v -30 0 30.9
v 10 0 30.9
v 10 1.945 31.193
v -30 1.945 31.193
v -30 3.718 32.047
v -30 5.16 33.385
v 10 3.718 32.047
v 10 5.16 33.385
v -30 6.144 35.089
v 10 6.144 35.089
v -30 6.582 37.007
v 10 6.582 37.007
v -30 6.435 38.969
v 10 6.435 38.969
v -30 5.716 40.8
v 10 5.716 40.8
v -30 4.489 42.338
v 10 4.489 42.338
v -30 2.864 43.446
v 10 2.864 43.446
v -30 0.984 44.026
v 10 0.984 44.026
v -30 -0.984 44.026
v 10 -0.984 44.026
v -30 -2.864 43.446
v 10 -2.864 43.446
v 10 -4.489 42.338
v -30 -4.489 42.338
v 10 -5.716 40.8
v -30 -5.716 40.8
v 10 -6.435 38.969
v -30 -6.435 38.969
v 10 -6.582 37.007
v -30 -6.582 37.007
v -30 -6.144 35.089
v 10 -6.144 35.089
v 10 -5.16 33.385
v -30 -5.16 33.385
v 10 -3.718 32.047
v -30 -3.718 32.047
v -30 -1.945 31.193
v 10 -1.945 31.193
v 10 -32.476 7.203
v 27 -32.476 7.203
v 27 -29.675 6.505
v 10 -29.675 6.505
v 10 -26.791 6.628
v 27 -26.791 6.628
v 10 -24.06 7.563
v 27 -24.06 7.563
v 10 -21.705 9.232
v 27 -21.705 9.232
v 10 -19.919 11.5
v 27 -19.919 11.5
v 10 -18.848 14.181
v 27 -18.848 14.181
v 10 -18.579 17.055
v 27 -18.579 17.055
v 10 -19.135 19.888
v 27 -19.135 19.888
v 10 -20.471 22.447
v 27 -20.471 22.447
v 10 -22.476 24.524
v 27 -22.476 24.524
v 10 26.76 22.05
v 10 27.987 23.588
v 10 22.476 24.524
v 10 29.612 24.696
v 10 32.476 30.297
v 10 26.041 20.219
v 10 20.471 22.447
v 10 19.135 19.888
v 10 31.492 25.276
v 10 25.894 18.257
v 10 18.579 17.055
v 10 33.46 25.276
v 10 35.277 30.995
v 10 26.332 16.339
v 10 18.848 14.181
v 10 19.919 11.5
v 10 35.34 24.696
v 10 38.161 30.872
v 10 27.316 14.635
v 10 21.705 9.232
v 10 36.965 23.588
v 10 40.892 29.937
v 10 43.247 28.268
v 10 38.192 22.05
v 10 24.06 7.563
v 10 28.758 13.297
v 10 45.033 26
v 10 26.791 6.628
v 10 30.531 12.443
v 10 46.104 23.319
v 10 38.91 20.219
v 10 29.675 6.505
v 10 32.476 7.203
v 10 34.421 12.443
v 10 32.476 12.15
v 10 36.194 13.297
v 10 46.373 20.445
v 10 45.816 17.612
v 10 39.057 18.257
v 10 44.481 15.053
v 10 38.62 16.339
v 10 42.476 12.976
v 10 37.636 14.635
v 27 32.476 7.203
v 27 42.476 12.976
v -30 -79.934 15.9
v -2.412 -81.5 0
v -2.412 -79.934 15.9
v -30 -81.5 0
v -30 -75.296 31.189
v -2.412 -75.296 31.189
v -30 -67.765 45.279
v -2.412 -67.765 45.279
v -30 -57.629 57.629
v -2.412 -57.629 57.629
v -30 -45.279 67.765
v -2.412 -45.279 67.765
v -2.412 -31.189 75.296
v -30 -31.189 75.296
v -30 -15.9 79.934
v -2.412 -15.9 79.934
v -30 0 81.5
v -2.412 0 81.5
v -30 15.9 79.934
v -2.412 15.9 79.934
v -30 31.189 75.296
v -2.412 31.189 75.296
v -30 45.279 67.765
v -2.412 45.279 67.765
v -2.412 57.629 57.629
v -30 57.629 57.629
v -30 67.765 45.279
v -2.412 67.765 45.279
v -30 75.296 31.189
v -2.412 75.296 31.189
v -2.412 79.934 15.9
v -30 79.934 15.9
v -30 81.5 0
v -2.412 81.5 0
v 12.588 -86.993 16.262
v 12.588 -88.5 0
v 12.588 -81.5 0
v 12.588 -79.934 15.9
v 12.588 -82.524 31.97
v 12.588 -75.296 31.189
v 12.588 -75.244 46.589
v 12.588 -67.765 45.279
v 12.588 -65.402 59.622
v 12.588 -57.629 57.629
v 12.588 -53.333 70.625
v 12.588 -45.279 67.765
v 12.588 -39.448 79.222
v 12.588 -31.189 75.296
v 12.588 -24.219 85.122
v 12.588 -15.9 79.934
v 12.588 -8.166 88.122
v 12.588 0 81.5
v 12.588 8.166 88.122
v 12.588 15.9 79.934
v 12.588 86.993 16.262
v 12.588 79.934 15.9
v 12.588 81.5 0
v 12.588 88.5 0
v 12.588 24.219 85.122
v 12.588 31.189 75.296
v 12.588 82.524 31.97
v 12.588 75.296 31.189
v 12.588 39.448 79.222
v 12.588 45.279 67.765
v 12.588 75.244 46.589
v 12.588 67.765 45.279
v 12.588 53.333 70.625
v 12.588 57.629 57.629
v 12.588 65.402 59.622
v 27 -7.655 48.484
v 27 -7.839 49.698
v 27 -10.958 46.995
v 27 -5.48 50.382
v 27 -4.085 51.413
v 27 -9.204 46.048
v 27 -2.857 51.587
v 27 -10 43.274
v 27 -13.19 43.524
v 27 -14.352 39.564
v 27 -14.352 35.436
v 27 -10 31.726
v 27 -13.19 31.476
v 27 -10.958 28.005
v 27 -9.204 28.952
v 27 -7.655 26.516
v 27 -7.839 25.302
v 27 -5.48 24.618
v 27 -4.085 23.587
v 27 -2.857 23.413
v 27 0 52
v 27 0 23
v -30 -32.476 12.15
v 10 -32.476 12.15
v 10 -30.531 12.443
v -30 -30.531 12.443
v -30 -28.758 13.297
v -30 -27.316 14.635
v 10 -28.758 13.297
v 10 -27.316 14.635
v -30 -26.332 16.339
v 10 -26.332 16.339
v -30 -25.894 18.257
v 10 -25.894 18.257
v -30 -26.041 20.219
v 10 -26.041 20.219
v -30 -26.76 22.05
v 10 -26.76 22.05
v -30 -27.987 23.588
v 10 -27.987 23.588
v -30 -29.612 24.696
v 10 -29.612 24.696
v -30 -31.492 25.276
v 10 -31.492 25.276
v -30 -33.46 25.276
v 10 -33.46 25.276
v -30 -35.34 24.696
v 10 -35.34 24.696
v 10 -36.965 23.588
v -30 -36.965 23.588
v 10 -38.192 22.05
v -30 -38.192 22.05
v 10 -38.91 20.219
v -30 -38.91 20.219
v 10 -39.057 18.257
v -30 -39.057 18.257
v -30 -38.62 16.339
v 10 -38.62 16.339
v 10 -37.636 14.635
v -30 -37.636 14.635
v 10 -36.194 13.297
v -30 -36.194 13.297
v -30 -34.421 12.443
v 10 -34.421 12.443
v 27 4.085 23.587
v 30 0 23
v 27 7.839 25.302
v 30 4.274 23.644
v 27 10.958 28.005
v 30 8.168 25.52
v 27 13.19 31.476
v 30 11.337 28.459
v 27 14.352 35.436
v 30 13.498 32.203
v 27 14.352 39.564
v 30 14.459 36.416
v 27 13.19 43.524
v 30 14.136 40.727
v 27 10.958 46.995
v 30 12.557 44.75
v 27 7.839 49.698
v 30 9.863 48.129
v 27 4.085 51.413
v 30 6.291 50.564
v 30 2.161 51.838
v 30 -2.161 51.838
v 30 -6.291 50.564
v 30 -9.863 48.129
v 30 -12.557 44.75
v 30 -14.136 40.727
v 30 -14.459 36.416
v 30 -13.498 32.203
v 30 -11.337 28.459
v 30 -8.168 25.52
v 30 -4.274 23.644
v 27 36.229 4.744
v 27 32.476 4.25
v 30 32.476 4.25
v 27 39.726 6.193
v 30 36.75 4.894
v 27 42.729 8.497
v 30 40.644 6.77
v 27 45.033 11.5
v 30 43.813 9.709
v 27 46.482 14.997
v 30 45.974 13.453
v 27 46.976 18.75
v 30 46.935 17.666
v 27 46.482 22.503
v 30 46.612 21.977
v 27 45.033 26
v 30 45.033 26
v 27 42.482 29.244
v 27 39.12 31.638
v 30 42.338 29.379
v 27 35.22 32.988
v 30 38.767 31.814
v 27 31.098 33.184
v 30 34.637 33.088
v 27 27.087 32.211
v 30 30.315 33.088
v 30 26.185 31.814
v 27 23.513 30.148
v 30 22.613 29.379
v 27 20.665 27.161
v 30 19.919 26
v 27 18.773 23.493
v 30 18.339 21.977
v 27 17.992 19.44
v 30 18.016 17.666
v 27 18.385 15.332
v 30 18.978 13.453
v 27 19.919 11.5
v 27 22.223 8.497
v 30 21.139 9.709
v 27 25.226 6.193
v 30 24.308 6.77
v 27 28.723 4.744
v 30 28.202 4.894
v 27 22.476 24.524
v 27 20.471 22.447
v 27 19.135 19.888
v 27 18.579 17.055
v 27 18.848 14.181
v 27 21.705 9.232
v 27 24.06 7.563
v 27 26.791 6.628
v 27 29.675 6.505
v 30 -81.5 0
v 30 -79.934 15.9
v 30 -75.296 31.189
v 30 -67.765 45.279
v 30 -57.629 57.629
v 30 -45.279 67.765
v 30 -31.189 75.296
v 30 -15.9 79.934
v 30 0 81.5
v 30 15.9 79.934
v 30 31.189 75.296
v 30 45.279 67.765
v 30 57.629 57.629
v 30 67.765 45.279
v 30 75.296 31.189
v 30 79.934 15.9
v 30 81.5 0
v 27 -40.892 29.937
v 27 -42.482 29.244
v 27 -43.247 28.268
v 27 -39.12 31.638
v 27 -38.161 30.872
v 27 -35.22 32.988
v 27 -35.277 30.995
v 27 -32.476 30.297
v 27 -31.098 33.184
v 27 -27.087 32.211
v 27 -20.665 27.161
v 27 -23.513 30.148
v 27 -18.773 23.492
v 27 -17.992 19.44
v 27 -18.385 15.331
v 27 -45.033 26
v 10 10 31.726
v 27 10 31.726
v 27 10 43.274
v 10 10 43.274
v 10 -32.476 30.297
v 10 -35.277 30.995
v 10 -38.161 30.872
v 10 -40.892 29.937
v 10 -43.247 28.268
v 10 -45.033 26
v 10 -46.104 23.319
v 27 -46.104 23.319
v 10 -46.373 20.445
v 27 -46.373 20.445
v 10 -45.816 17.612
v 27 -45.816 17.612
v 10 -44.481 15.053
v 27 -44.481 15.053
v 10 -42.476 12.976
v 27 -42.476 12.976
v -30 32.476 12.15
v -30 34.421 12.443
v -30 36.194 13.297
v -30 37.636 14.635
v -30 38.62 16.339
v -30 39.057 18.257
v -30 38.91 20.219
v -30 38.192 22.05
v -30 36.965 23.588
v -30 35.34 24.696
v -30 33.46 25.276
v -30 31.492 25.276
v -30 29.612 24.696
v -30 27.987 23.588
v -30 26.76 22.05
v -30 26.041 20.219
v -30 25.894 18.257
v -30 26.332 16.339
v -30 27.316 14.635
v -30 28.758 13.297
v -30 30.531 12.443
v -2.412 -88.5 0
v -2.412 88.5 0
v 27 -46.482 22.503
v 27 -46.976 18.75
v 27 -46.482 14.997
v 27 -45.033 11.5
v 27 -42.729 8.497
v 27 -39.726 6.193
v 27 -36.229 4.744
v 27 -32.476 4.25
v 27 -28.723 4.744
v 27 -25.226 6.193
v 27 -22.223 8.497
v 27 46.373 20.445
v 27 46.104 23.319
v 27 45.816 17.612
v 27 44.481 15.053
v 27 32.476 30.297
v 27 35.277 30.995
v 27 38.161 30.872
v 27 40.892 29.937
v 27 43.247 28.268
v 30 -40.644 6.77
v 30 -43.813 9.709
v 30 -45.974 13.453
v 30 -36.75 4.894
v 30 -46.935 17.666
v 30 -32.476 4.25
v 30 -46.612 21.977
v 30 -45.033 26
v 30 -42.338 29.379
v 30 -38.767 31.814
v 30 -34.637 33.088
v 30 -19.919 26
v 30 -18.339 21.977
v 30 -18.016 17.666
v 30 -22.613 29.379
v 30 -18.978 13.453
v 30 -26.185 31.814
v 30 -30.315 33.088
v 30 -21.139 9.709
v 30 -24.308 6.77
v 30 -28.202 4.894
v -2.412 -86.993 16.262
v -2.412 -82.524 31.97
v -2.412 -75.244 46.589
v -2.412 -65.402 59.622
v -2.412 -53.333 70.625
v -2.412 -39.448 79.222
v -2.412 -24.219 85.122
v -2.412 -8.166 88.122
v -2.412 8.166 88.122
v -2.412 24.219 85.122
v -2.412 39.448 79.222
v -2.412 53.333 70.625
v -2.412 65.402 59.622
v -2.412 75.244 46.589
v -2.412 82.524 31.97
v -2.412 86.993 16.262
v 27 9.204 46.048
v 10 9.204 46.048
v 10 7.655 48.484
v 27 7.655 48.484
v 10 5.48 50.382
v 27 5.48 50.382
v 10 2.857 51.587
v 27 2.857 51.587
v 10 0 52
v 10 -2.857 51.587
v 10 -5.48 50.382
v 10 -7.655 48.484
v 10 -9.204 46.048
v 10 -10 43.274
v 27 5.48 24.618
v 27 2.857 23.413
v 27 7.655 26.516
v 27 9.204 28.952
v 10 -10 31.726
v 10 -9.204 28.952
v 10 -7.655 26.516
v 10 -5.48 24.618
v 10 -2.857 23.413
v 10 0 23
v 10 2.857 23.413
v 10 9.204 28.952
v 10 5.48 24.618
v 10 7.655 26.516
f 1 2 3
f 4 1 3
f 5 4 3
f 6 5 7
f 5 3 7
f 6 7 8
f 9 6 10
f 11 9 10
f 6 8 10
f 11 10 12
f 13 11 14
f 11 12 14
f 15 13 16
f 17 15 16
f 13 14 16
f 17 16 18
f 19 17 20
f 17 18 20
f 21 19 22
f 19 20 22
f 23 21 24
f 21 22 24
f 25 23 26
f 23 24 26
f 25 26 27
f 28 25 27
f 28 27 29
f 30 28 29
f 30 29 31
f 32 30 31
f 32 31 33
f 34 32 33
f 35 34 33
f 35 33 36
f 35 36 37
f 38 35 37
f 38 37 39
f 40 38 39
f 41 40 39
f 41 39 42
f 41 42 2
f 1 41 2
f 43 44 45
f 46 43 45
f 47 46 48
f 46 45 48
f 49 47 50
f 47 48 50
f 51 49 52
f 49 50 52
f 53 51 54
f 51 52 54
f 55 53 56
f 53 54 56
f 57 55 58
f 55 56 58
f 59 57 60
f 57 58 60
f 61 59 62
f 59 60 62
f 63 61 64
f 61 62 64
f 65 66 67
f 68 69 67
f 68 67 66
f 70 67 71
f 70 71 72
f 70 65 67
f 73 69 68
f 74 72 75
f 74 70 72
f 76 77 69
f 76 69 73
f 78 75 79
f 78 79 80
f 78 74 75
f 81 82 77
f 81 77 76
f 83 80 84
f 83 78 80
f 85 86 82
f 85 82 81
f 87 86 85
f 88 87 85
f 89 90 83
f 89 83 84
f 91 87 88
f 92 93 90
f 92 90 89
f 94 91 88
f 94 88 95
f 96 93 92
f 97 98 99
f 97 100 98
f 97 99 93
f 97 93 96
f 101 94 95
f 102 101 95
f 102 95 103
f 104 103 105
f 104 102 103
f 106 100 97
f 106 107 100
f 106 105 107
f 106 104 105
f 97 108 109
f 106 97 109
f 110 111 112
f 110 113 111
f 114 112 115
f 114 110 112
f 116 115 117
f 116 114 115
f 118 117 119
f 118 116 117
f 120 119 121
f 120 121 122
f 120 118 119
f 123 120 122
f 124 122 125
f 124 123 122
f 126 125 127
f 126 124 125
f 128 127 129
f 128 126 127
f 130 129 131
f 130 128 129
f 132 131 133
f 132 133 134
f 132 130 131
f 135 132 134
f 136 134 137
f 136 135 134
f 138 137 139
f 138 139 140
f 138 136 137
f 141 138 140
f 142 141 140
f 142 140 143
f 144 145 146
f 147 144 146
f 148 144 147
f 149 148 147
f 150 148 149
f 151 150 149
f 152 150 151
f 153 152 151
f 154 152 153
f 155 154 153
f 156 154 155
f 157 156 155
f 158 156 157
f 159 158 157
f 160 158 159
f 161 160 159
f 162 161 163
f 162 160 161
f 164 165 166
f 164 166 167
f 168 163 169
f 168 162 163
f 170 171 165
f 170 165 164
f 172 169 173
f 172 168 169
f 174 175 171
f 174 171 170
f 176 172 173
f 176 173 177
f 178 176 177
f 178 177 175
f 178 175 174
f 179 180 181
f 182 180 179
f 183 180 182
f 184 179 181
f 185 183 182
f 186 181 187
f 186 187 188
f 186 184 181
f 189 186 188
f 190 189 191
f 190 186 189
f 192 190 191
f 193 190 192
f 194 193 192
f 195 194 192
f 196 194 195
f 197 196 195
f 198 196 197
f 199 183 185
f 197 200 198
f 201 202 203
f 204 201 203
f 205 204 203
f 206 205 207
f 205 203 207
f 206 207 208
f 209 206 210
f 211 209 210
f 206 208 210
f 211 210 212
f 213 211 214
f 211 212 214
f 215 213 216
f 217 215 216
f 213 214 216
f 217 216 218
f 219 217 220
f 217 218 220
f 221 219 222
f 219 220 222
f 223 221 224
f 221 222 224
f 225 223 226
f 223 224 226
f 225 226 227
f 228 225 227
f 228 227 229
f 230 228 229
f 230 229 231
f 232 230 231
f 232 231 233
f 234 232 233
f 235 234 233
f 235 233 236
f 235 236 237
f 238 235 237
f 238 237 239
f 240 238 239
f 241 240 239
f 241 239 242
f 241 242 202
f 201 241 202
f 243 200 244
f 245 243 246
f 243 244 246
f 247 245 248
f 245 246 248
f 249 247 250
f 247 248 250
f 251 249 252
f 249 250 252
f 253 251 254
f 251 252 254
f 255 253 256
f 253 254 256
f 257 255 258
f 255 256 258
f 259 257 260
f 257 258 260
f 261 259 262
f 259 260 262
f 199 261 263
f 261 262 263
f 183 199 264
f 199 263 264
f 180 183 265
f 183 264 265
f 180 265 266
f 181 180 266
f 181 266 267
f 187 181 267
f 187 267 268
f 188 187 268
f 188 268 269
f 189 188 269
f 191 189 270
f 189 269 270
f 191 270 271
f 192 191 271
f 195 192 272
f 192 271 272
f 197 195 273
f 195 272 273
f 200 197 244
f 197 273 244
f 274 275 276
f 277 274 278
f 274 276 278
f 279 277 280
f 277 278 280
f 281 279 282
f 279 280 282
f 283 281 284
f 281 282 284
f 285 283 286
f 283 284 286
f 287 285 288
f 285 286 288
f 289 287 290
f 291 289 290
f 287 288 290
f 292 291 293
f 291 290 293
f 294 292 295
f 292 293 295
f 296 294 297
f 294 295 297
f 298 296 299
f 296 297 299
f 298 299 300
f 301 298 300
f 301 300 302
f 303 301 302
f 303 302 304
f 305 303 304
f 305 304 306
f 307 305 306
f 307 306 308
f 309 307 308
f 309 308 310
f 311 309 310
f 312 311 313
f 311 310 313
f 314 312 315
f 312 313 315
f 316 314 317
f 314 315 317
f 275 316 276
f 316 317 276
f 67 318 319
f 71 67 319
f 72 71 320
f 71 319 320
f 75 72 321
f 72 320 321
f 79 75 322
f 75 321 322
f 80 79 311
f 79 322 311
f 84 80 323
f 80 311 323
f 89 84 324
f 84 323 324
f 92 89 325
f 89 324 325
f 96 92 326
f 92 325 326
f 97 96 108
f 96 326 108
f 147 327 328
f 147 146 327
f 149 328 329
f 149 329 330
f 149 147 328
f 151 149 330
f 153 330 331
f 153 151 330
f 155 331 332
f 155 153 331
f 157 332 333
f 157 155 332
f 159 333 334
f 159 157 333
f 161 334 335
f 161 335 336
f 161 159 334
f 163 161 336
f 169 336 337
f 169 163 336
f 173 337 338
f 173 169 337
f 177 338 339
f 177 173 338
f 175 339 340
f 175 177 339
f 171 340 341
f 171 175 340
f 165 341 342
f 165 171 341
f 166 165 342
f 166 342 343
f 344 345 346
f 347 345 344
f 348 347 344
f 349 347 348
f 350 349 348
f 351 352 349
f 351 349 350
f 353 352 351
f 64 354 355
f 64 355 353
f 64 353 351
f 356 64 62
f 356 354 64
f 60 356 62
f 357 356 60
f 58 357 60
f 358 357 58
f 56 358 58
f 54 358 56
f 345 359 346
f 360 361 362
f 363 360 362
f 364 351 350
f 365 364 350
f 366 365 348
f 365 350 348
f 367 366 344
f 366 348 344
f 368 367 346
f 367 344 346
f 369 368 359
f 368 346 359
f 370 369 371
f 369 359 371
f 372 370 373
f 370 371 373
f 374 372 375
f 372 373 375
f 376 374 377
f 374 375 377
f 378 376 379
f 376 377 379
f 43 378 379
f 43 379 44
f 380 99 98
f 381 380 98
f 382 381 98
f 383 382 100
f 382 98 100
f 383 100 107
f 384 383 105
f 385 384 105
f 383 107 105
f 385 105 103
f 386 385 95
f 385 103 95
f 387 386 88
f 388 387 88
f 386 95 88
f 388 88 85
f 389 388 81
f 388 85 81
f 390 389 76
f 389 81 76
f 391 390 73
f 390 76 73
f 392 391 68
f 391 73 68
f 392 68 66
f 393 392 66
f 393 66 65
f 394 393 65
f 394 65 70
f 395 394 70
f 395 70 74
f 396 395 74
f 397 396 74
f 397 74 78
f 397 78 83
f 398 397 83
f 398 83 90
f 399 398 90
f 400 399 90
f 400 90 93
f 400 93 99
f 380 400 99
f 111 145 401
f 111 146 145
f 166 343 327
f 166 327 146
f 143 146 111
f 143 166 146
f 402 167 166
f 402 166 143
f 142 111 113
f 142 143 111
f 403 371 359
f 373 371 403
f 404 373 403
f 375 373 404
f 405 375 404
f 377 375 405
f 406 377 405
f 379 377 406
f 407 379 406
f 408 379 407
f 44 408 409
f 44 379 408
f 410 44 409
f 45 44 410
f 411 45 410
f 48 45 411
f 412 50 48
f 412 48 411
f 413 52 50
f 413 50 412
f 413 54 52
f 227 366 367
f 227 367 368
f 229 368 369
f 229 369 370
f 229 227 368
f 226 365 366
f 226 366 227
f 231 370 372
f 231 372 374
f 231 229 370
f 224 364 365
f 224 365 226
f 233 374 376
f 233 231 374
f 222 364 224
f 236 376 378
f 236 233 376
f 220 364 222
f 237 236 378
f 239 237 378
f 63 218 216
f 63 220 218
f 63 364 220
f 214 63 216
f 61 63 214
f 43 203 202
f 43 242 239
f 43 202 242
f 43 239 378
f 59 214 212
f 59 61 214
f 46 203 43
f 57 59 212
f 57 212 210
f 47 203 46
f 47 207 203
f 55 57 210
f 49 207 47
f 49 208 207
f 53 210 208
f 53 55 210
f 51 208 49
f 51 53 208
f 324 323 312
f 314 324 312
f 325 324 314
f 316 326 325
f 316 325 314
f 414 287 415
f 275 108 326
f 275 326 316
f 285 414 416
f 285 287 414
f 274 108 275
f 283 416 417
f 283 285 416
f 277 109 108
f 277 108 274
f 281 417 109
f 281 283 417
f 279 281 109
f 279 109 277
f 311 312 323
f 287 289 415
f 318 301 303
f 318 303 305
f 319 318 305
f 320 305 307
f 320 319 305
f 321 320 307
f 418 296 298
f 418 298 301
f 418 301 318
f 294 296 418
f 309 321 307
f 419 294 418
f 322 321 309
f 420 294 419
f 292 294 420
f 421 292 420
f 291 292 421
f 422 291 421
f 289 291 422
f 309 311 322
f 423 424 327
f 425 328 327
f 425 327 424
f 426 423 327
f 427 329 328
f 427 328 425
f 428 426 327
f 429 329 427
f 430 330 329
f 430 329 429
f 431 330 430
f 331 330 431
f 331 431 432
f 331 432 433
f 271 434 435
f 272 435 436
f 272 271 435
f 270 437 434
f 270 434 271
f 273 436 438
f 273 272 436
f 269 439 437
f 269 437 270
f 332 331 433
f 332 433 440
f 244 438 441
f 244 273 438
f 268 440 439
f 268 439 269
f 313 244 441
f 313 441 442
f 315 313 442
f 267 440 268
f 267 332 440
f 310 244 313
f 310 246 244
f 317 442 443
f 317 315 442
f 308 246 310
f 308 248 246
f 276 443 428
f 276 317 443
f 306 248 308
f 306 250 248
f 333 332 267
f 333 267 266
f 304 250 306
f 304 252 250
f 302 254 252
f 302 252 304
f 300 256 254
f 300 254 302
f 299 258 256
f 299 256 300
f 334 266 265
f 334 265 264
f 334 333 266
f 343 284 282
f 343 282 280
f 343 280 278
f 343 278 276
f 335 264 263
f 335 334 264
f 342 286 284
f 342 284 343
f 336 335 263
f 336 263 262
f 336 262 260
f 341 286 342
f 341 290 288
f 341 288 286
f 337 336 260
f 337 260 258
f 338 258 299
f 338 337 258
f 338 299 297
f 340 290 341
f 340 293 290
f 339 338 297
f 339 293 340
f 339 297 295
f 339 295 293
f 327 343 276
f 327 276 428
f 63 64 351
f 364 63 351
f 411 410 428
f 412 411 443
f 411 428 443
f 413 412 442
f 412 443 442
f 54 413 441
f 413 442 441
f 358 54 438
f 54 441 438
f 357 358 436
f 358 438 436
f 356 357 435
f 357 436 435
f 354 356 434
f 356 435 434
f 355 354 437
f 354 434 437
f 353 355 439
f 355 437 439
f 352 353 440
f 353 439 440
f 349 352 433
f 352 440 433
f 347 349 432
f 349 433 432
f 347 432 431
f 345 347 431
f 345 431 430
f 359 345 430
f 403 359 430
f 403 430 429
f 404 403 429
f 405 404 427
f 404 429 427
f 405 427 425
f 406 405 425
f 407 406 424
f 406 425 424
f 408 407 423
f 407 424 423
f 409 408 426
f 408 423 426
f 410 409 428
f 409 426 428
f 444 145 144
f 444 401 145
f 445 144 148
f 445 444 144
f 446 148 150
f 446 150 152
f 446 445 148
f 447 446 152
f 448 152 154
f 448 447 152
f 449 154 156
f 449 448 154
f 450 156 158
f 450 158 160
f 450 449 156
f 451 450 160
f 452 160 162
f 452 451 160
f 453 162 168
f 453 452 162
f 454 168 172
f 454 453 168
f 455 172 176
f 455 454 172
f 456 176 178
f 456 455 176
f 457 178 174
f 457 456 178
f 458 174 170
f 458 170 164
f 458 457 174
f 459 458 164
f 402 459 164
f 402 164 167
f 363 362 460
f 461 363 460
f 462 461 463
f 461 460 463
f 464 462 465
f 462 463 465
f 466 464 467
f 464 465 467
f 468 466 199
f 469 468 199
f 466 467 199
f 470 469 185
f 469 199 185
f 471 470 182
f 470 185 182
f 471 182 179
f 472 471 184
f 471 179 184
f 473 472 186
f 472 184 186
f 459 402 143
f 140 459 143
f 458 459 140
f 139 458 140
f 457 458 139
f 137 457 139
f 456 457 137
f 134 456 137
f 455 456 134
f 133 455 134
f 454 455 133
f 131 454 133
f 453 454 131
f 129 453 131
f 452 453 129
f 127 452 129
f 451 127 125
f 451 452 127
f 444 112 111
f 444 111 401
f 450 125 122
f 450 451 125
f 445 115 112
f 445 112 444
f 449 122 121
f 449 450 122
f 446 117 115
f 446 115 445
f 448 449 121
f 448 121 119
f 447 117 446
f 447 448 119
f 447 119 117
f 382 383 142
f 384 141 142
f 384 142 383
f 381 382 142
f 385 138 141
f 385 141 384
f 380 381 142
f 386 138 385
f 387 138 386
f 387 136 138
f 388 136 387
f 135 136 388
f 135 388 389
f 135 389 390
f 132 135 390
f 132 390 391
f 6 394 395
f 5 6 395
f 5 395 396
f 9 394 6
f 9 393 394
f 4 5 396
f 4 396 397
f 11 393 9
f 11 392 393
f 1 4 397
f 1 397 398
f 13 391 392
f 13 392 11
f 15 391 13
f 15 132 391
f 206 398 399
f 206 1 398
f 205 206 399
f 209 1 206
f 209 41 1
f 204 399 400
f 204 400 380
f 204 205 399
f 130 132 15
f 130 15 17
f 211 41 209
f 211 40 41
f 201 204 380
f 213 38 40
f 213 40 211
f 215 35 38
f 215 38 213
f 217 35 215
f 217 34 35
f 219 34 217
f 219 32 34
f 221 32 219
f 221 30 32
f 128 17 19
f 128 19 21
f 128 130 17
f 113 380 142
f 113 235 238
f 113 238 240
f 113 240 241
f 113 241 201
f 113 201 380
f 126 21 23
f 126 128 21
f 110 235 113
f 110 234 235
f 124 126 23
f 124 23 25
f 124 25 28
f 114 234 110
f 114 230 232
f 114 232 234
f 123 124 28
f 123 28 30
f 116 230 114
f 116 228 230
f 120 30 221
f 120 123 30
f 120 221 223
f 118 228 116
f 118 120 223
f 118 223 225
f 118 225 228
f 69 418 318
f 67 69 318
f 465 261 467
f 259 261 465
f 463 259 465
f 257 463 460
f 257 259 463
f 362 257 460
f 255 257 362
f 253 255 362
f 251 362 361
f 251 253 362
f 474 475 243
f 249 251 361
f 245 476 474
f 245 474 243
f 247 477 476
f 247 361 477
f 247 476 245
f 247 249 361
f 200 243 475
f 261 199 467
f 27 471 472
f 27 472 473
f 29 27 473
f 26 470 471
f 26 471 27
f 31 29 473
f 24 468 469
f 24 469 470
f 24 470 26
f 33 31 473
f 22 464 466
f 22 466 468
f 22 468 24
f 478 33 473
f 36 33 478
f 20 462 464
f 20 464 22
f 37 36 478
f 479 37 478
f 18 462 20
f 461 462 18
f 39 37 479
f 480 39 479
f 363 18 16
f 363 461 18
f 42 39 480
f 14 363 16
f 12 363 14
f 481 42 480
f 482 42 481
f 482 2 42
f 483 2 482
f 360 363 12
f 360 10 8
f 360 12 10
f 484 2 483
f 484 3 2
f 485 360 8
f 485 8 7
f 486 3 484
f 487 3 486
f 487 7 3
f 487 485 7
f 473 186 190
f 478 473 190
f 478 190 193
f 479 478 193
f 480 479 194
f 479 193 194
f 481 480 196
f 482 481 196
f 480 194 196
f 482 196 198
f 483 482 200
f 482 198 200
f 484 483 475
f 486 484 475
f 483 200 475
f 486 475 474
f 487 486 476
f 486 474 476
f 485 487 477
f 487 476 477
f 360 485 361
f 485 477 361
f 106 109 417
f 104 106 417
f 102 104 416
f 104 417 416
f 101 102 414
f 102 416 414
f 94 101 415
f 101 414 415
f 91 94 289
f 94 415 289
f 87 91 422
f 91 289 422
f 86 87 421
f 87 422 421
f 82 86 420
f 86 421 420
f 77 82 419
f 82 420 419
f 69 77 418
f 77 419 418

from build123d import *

# Parameters (mm, degrees)
REVOLVE_1_ANGLE     = 180
SKETCH_2_R          = 6.6
CUT_EXTRUDE_1_DEPTH = 139.796613792
CUT_EXTRUDE_2_DEPTH = 20
SKETCH_6_R          = 14.5
CUT_EXTRUDE_3_DEPTH = 3


with BuildPart() as part:
    # Эскиз1 → Повернуть1 (revolve)
    with BuildSketch(Plane.XY):
        Polygon((12.5885, -88.5), (-2.4115, -88.5), (-2.4115, -81.5), (-30, -81.5), (-30, 0), (30, 0), (30, -81.5), (12.5885, -81.5), align=None)
    revolve(axis=Axis((0, 0, 0), (-1, 0, 0)), revolution_arc=REVOLVE_1_ANGLE)

    # Эскиз2 → Вырез-Вытянуть1 (cut, through all)
    with BuildSketch(Plane(origin=(30, 0, 0), x_dir=(0, 0, -1), z_dir=(1, 0, 0))):
        with Locations((-37.5, 0)):
            Circle(SKETCH_2_R)
        with Locations((-18.75, 32.475952642)):
            Circle(SKETCH_2_R)
        with Locations((18.75, 32.475952642)):
            Circle(SKETCH_2_R)
        with Locations((37.5, 0)):
            Circle(SKETCH_2_R)
        with Locations((18.75, -32.475952642)):
            Circle(SKETCH_2_R)
        with Locations((-18.75, -32.475952642)):
            Circle(SKETCH_2_R)
    extrude(amount=-CUT_EXTRUDE_1_DEPTH, mode=Mode.SUBTRACT)

    # Эскиз5 → Вырез-Вытянуть2 (cut)
    with BuildSketch(Plane(origin=(30, 0, 0), x_dir=(0, 0, -1), z_dir=(1, 0, 0))):
        with BuildLine():
            Line((-7.202994616, 32.475952642), (-12.976497308, 42.475952642))
            ThreePointArc((-12.976497308, 42.475952642), (-26, 45.033320997), (-30.297005384, 32.475952642))
            Line((-30.297005384, 32.475952642), (-24.523502692, 22.475952642))
            ThreePointArc((-24.523502692, 22.475952642), (-11.5, 19.918584287), (-7.202994616, 32.475952642))
        make_face()
        with BuildLine():
            Line((24.523502692, 22.475952642), (30.297005384, 32.475952642))
            ThreePointArc((30.297005384, 32.475952642), (26, 45.033320997), (12.976497308, 42.475952642))
            Line((12.976497308, 42.475952642), (7.202994616, 32.475952642))
            ThreePointArc((7.202994616, 32.475952642), (11.5, 19.918584287), (24.523502692, 22.475952642))
        make_face()
        with BuildLine():
            Line((31.726497308, -10), (43.273502692, -10))
            ThreePointArc((43.273502692, -10), (52, 0), (43.273502692, 10))
            Line((43.273502692, 10), (31.726497308, 10))
            ThreePointArc((31.726497308, 10), (23, 0), (31.726497308, -10))
        make_face()
        with BuildLine():
            Line((7.202994616, -32.475952642), (12.976497308, -42.475952642))
            ThreePointArc((12.976497308, -42.475952642), (26, -45.033320997), (30.297005384, -32.475952642))
            Line((30.297005384, -32.475952642), (24.523502692, -22.475952642))
            ThreePointArc((24.523502692, -22.475952642), (11.5, -19.918584287), (7.202994616, -32.475952642))
        make_face()
        with BuildLine():
            Line((-24.523502692, -22.475952642), (-30.297005384, -32.475952642))
            ThreePointArc((-30.297005384, -32.475952642), (-26, -45.033320997), (-12.976497308, -42.475952642))
            Line((-12.976497308, -42.475952642), (-7.202994616, -32.475952642))
            ThreePointArc((-7.202994616, -32.475952642), (-11.5, -19.918584287), (-24.523502692, -22.475952642))
        make_face()
        with BuildLine():
            Line((-31.726497308, 10), (-43.273502692, 10))
            ThreePointArc((-43.273502692, 10), (-52, 0), (-43.273502692, -10))
            Line((-43.273502692, -10), (-31.726497308, -10))
            ThreePointArc((-31.726497308, -10), (-23, 0), (-31.726497308, 10))
        make_face()
    extrude(amount=-CUT_EXTRUDE_2_DEPTH, mode=Mode.SUBTRACT)

    # Эскиз6 → Вырез-Вытянуть3 (cut)
    with BuildSketch(Plane(origin=(30, 0, 0), x_dir=(0, 0, -1), z_dir=(1, 0, 0))):
        with Locations((-37.5, 0)):
            Circle(SKETCH_6_R)
        with Locations((-18.75, -32.475952642)):
            Circle(SKETCH_6_R)
        with Locations((-18.75, 32.475952642)):
            Circle(SKETCH_6_R)
    extrude(amount=-CUT_EXTRUDE_3_DEPTH, mode=Mode.SUBTRACT)


solid = part.part
